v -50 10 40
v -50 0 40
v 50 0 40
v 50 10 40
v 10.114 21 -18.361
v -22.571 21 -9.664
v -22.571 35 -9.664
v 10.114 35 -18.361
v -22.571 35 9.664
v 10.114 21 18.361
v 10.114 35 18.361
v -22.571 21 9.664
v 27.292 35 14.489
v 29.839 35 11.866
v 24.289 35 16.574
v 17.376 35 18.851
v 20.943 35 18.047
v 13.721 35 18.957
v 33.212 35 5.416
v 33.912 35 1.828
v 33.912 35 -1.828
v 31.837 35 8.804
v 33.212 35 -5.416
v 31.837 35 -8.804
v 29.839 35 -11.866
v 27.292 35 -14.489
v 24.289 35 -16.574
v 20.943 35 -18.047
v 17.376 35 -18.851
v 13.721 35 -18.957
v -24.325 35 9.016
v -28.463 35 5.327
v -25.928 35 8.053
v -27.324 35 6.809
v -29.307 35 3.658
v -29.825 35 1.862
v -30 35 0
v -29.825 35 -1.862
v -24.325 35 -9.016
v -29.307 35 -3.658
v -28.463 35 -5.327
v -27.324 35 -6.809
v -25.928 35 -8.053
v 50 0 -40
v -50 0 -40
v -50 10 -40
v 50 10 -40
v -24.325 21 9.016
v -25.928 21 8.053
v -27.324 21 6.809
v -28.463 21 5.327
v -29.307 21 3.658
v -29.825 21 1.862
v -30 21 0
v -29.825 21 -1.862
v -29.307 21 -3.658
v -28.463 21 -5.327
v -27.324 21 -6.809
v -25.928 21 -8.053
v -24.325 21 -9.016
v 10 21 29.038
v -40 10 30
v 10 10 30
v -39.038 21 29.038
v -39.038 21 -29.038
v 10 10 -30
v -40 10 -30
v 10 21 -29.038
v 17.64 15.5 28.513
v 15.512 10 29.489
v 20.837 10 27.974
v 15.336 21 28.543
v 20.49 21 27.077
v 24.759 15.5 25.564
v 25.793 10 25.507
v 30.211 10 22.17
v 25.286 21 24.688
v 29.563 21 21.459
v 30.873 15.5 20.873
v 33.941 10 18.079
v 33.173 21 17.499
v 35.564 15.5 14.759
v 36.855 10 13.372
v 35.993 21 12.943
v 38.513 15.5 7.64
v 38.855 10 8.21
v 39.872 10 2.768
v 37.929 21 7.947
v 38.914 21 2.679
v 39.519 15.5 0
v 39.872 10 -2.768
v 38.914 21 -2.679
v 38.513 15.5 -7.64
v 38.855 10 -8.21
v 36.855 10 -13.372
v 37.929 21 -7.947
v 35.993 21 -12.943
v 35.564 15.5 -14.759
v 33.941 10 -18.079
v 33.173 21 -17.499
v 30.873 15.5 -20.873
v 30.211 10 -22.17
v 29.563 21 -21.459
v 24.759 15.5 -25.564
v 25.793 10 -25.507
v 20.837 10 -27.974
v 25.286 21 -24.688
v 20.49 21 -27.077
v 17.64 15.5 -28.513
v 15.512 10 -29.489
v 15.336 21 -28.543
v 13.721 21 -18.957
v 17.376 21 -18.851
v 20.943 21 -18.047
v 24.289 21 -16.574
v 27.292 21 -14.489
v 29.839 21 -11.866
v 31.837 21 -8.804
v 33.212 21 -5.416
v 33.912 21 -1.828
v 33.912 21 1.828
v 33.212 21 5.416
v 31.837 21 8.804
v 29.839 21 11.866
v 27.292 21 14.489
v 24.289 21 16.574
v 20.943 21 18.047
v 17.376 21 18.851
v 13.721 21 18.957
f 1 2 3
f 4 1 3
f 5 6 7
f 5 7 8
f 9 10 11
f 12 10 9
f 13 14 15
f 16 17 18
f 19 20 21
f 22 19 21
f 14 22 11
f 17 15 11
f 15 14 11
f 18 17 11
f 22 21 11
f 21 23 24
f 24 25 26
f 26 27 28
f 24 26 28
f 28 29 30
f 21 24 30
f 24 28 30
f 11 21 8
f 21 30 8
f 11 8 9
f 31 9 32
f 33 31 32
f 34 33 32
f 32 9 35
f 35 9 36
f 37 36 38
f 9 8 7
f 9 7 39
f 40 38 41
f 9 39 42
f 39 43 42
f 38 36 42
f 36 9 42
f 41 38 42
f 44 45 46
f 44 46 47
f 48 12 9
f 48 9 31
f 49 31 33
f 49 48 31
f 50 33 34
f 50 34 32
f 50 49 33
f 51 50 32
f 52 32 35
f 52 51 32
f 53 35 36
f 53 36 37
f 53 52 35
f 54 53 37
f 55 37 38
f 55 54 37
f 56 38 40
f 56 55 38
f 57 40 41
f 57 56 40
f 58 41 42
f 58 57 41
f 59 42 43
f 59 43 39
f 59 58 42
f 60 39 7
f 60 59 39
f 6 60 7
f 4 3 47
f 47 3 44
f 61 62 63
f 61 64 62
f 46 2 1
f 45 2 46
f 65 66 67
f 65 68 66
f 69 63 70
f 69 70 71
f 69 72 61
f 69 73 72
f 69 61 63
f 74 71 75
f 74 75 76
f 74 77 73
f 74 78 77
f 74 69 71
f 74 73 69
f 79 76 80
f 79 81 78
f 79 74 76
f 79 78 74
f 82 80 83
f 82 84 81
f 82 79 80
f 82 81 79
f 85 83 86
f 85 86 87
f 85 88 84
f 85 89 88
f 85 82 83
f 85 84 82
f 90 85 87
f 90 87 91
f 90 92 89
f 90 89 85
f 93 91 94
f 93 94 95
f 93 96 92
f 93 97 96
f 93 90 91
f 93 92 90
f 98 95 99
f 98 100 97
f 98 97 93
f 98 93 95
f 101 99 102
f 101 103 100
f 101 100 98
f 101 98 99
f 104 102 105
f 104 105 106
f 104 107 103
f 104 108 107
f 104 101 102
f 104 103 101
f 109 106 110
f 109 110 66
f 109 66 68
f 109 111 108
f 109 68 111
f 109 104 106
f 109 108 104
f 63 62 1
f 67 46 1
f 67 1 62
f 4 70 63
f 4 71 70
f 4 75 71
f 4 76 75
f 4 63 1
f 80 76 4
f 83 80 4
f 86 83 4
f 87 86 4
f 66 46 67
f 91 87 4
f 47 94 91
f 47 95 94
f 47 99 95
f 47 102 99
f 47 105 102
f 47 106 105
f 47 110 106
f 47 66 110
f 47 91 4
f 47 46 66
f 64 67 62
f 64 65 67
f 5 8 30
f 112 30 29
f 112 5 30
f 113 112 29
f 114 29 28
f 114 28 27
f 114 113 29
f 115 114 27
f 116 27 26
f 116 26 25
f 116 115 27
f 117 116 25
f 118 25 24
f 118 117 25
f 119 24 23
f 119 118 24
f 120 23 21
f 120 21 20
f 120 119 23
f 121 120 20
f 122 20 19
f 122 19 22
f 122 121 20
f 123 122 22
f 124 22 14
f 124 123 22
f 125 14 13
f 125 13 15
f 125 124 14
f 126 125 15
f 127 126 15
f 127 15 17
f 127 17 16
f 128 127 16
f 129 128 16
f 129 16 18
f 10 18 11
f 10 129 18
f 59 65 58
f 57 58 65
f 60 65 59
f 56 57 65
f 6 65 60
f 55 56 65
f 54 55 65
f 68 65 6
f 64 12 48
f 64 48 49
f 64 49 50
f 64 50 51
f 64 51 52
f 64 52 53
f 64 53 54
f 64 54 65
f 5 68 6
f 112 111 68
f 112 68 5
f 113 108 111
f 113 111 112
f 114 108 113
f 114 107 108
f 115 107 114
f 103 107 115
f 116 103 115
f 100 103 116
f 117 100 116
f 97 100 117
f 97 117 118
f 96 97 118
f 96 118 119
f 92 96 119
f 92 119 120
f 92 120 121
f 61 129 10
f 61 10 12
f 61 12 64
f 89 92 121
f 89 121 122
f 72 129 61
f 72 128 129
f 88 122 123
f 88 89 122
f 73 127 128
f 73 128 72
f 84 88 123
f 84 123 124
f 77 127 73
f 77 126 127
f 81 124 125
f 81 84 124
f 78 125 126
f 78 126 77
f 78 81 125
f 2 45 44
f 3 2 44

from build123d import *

# Parameters (mm, degrees)
SKETCH_1_W      = 100
SKETCH_1_H      = 80
EXTRUDE_1_DEPTH = 10
EXTRUDE_2_DEPTH = 11
EXTRUDE_2_TAPER = 5
EXTRUDE_3_DEPTH = 14


with BuildPart() as part:
    # 스케치1 → 보스-돌출1 (new body)
    with BuildSketch(Plane(origin=(0, 0, 0), x_dir=(1, 0, 0), z_dir=(0, 1, 0))):
        Rectangle(SKETCH_1_W, SKETCH_1_H)
    extrude(amount=EXTRUDE_1_DEPTH)

    # 스케치2 → 보스-돌출2 (add)
    with BuildSketch(Plane(origin=(0, 10, 0), x_dir=(1, 0, 0), z_dir=(0, 1, 0))):
        with BuildLine():
            Line((10, 30), (-40, 30))
            Line((-40, 30), (-40, -30))
            Line((-40, -30), (10, -30))
            ThreePointArc((10, -30), (40, 0), (10, 30))
        make_face()
    extrude(amount=EXTRUDE_2_DEPTH, taper=EXTRUDE_2_TAPER)

    # 스케치3 → 보스-돌출3 (add)
    with BuildSketch(Plane(origin=(0, 21, 0), x_dir=(1, 0, 0), z_dir=(0, 1, 0))):
        with BuildLine():
            Line((-22.571428571, 9.663734014), (10.114285714, 18.361094627))
            ThreePointArc((10.114285714, 18.361094627), (34, 0), (10.114285714, -18.361094627))
            Line((10.114285714, -18.361094627), (-22.571428571, -9.663734014))
            ThreePointArc((-22.571428571, -9.663734014), (-30, 0), (-22.571428571, 9.663734014))
        make_face()
    extrude(amount=EXTRUDE_3_DEPTH)


solid = part.part
